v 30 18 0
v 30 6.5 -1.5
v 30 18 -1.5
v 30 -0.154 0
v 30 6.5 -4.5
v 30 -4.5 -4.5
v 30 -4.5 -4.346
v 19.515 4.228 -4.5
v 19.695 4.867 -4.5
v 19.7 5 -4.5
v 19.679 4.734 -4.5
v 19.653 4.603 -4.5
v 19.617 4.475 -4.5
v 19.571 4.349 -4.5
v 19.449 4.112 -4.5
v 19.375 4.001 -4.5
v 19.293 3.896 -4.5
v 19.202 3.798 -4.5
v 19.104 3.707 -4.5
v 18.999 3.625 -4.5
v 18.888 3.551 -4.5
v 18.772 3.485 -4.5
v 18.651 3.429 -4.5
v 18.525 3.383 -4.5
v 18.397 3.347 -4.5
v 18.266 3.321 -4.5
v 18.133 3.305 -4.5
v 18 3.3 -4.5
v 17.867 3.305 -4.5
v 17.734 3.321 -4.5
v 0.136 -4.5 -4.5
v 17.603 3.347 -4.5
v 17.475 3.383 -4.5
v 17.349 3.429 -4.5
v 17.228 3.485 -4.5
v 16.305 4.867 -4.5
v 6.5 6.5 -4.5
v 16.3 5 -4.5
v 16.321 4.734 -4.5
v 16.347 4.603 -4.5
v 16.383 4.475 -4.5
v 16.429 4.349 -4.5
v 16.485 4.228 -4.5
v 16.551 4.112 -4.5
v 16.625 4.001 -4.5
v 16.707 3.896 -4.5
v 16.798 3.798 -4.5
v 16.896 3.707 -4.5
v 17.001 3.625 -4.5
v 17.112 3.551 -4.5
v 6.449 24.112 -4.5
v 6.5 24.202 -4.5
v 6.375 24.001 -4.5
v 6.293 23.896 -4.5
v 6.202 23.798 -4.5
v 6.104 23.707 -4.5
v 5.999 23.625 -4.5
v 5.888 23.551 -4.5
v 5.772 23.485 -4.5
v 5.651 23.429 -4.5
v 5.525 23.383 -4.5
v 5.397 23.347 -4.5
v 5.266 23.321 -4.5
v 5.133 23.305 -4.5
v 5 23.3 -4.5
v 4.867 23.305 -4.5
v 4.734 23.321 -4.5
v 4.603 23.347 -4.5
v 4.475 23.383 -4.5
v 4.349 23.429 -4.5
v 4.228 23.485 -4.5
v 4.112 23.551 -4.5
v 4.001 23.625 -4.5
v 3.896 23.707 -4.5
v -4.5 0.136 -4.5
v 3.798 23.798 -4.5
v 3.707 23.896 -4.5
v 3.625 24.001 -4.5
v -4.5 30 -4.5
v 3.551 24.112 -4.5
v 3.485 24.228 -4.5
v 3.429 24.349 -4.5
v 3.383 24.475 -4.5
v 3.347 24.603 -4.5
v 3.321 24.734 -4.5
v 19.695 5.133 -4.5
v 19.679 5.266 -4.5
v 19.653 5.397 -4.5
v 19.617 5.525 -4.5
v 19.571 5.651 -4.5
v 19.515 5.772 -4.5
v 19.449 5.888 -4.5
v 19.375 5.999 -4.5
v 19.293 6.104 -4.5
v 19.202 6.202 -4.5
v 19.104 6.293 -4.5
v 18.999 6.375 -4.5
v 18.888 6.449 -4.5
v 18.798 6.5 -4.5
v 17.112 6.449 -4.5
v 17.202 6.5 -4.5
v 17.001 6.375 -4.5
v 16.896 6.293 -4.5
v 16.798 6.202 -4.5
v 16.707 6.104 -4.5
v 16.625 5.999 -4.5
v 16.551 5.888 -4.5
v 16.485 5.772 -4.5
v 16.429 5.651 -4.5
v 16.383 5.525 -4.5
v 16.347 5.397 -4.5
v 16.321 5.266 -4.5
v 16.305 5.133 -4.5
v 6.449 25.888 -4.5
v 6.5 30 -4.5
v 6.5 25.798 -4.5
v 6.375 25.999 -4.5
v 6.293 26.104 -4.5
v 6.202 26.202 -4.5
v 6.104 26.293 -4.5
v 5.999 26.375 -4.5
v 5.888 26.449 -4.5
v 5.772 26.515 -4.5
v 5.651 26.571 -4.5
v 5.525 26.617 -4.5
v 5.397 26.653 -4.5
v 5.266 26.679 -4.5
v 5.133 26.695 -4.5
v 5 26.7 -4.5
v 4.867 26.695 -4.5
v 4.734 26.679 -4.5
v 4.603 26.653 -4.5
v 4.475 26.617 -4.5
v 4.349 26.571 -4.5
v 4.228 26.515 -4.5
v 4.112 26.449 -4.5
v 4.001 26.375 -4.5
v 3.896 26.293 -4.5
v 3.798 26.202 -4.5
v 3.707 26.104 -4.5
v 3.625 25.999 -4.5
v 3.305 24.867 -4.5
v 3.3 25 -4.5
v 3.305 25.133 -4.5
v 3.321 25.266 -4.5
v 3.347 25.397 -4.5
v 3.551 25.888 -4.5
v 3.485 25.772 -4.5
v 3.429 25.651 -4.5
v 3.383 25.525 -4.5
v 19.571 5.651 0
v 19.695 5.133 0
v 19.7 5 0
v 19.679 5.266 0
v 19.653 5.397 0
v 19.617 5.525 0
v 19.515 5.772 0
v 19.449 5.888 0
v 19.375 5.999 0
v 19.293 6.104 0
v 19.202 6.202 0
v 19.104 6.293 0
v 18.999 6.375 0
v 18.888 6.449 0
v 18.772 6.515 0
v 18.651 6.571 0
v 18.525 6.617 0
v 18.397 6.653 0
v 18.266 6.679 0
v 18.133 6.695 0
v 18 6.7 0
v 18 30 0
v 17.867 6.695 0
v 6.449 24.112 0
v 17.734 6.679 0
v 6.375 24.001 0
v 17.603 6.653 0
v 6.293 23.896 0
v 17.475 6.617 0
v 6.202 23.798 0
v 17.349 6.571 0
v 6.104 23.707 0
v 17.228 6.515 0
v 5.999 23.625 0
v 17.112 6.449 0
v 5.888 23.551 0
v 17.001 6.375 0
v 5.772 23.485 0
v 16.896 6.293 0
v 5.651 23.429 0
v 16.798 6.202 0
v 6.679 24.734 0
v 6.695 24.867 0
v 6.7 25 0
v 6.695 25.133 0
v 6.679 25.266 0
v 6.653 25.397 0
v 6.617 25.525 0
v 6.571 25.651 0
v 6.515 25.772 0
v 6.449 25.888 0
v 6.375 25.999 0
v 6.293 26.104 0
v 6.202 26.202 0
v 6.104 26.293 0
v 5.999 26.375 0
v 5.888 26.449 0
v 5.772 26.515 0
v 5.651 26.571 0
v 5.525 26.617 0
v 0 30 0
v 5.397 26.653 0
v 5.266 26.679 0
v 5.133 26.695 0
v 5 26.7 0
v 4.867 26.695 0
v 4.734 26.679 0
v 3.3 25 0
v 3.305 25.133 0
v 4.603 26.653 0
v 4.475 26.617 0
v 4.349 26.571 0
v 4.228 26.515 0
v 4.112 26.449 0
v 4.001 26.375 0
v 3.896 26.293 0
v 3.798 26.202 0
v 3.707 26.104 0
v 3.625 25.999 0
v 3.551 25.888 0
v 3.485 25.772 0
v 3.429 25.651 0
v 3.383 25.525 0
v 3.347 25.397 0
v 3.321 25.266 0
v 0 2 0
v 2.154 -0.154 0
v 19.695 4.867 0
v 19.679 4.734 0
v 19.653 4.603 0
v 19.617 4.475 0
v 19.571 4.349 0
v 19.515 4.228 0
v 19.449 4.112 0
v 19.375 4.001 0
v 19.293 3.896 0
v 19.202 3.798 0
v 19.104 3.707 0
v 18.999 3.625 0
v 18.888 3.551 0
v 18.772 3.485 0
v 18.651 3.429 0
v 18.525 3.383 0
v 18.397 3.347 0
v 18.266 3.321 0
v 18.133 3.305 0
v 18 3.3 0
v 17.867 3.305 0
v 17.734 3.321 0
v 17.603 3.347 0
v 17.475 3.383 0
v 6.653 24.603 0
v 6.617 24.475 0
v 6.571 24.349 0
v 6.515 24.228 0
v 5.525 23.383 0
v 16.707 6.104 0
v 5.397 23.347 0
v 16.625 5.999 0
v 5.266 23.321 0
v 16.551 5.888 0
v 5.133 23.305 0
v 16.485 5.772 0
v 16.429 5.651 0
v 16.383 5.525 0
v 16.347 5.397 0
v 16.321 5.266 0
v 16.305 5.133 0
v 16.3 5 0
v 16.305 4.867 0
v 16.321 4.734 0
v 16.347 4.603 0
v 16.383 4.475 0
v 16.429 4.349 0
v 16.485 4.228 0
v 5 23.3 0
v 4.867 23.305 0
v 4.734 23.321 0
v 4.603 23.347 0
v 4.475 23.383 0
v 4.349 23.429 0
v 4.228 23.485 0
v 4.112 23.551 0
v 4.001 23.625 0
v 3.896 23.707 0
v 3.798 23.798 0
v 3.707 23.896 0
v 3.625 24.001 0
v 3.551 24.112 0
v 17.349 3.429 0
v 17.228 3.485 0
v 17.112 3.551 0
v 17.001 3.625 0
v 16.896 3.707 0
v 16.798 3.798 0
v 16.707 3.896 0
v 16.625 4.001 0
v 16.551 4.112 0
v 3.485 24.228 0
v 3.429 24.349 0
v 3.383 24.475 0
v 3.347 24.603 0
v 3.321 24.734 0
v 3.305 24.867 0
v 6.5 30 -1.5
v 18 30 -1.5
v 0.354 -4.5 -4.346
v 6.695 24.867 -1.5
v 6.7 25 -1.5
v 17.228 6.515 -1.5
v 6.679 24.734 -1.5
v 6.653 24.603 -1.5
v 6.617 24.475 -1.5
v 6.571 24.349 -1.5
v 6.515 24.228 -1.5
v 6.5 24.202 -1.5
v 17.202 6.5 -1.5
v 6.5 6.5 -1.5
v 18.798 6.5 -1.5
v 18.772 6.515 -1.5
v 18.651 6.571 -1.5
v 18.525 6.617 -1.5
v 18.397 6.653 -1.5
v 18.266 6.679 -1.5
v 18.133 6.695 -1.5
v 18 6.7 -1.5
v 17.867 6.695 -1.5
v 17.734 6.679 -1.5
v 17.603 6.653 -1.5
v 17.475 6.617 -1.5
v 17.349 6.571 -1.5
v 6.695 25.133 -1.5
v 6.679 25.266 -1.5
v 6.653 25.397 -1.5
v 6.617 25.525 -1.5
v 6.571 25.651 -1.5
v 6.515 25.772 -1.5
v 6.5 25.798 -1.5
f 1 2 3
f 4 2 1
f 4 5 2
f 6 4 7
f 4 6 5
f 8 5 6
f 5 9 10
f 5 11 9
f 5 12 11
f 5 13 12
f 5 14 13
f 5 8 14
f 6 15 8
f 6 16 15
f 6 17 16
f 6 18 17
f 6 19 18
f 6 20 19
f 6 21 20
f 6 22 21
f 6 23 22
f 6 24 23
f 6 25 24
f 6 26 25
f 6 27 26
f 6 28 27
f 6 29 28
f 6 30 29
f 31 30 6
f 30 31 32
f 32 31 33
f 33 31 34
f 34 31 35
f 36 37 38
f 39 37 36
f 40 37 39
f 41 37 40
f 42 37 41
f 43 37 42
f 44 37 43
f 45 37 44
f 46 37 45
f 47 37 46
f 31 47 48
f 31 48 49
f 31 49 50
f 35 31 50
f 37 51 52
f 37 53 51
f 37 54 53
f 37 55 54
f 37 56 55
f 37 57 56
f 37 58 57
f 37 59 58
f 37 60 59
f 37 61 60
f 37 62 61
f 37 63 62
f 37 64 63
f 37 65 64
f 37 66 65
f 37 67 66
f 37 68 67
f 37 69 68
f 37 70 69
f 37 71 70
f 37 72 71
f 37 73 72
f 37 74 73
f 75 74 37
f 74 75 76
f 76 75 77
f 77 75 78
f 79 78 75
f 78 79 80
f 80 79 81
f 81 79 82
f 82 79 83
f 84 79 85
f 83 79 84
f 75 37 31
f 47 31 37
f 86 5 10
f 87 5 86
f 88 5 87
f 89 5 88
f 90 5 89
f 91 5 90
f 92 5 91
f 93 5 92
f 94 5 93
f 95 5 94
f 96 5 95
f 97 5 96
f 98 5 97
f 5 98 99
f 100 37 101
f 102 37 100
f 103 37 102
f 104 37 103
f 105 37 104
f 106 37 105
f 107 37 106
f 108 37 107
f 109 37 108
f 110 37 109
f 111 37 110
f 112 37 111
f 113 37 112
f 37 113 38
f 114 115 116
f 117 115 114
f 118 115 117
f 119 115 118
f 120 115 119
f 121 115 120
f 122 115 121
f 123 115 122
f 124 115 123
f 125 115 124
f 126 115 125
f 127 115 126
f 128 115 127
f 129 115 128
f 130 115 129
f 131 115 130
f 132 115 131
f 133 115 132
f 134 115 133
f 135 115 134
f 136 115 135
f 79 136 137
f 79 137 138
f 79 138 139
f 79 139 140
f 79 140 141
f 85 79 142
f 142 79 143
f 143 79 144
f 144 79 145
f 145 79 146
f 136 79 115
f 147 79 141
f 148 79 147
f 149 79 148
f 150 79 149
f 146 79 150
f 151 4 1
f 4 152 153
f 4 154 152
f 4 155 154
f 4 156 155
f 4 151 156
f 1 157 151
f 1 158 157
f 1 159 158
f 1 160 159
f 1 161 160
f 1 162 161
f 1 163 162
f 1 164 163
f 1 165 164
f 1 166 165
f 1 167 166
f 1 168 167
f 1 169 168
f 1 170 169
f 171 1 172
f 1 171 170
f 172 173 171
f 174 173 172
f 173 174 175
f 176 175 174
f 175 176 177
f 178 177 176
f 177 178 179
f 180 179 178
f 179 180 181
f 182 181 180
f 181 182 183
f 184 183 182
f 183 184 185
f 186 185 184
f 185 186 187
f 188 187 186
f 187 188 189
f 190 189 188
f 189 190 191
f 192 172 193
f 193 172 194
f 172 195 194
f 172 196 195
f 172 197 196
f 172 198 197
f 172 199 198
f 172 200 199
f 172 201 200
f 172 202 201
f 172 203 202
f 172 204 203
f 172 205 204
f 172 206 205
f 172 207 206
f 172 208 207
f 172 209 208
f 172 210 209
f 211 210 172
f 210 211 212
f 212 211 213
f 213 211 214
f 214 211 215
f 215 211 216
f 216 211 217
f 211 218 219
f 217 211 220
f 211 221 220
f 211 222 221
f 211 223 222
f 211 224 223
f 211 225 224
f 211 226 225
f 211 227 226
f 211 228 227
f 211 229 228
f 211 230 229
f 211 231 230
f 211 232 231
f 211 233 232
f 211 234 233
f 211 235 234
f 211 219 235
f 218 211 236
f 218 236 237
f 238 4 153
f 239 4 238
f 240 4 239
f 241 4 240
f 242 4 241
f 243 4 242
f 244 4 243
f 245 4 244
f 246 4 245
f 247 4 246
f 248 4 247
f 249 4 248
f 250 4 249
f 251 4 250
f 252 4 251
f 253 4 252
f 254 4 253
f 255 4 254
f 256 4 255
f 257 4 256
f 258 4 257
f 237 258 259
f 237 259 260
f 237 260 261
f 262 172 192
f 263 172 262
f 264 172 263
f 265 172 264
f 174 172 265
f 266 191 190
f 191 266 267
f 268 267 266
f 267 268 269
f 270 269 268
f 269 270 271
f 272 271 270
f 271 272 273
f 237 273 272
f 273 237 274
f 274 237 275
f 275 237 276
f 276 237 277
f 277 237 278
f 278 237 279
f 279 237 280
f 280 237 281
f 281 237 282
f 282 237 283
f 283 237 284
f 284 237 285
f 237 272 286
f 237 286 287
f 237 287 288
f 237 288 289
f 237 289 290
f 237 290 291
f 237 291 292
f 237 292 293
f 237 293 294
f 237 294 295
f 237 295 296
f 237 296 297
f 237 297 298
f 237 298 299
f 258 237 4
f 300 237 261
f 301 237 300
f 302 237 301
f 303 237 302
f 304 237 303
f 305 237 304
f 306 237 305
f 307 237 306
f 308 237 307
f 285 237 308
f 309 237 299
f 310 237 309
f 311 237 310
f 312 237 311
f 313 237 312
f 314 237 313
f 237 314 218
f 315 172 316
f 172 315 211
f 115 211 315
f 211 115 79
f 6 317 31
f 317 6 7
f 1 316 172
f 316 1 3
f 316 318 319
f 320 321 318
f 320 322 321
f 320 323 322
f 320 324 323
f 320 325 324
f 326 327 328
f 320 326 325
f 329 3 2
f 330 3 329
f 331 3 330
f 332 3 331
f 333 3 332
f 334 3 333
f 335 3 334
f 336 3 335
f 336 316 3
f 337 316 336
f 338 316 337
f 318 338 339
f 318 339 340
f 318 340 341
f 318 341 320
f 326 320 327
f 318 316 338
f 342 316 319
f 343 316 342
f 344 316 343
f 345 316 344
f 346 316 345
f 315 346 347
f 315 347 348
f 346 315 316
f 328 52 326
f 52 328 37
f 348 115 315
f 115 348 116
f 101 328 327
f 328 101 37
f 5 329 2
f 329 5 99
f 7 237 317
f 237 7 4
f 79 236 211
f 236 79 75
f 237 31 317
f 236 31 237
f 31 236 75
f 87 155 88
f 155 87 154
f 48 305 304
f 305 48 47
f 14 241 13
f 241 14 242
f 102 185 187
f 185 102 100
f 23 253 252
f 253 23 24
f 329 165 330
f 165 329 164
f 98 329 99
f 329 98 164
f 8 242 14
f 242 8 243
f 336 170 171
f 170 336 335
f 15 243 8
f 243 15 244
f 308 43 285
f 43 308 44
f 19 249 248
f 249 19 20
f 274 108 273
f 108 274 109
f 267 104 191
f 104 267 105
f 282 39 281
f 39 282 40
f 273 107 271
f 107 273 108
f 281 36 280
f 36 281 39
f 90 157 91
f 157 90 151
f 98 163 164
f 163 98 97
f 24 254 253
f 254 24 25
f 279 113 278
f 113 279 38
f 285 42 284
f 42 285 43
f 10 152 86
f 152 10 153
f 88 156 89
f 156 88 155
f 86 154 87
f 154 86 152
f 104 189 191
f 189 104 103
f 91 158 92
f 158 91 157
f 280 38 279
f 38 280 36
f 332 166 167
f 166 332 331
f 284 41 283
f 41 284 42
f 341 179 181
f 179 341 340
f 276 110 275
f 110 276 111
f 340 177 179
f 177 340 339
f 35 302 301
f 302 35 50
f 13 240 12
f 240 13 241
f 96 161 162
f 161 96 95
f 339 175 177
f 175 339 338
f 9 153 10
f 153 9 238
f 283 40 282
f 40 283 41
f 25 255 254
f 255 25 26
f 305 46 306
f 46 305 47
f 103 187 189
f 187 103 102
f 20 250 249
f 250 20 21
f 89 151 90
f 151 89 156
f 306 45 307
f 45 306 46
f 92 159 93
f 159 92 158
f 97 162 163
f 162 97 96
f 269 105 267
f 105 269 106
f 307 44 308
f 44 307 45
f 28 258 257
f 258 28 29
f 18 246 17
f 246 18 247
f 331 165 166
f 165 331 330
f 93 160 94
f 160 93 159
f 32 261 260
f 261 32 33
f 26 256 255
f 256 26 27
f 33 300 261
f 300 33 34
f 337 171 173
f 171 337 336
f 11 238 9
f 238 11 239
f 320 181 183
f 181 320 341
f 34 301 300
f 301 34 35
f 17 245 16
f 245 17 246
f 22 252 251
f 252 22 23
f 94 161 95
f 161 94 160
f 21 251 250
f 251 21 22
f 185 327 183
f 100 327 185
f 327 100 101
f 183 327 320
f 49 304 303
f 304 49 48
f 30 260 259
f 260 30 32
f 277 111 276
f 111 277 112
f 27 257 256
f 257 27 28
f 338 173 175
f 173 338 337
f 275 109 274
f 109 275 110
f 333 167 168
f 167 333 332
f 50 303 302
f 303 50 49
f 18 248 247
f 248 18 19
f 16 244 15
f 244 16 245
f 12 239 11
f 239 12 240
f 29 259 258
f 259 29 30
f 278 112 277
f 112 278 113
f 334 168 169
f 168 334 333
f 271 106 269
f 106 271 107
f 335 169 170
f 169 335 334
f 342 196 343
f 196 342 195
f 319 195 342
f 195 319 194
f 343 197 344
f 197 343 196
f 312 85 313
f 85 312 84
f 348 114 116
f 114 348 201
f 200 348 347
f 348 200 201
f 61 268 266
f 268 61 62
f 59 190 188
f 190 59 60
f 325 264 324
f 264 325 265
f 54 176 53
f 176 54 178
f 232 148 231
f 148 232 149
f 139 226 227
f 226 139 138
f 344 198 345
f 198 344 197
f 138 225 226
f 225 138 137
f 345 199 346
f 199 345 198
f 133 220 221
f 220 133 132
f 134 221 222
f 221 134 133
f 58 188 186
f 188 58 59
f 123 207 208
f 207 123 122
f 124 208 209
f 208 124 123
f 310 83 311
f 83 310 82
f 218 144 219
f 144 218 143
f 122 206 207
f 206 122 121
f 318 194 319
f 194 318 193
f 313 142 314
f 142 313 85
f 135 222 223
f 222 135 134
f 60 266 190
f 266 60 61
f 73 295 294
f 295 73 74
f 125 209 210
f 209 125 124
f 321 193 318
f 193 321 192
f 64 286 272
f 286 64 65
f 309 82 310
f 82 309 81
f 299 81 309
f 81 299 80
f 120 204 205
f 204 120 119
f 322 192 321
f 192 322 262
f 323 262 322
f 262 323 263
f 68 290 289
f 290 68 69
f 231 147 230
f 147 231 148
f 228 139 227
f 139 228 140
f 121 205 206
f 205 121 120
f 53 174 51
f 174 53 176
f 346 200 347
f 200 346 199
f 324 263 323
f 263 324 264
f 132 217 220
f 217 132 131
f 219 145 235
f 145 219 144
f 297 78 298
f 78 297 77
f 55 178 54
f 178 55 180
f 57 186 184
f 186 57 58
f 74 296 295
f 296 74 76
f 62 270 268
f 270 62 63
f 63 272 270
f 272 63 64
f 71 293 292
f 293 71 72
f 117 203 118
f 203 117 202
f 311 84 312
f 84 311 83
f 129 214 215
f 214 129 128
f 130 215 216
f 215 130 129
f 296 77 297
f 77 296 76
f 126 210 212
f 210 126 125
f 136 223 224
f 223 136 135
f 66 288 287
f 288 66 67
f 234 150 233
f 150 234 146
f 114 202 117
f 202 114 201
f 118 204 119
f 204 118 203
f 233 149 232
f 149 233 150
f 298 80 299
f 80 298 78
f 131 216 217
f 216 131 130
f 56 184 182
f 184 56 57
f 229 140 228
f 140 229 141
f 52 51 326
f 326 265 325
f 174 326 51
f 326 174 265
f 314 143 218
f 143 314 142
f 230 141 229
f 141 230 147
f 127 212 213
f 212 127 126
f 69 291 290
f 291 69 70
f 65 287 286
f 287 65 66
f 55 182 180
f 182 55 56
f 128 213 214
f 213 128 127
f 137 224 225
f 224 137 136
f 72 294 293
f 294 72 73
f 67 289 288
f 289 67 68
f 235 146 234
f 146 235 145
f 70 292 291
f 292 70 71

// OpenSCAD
// file: params.scad
EXTRUSION_LEN = 150;
MOTOR_SIZE = 1.4*25.4;

MGN5_CARR_LEN = 16;
MGN7_CARR_LEN = 30.8;
ST3H_CARR_LEN = 15.5;

BED_X = 90;
BED_Y = 80;

MAIN = "#202020";
ACCENT = "red";

TOPHAT_HEIGHT = 100;
// file: panels.scad
include <params.scad>;

module deck_panel() {
    minkowski() {
        difference() {
            square([EXTRUSION_LEN, EXTRUSION_LEN-MOTOR_SIZE]);
            
            // Front corners
            square([4, 4]);
            translate([EXTRUSION_LEN - 4, 0]) square([4, 4]);
            
            // Rear space
            translate([EXTRUSION_LEN/2-32.5, EXTRUSION_LEN-MOTOR_SIZE-20]) square([65, 20]);
            translate([EXTRUSION_LEN/2-18, EXTRUSION_LEN-MOTOR_SIZE-26]) square([36, 26]);
            
            // Cable chain hole
            translate([EXTRUSION_LEN/2+32.5, EXTRUSION_LEN-MOTOR_SIZE-16]) square([12, 16]);
        }
        circle(r=1.5);
    }
}

module motor_panel() {
    minkowski() {
        difference() {
            square([EXTRUSION_LEN-25*2-26-3, MOTOR_SIZE-3]);
        
            translate([-1.5, (MOTOR_SIZE-3)/2-3.5]) square([6, 3.5+4]);
            translate([EXTRUSION_LEN-25*2-26-3-3-1.5, (MOTOR_SIZE-3)/2-3.5]) square([6, 3.5+4]);
        }
        
        circle(r=1.5);
    }
}

module screw_hole() {
    hull() {
        translate([-1, 0]) circle(r=1.75);
        translate([1, 0]) circle(r=1.75);
    }
}

module rear_chamber_panel() {
    translate([.5, .5]) difference() {
        square([EXTRUSION_LEN+19, EXTRUSION_LEN-20-1]);
        
        translate([10+EXTRUSION_LEN/2-25, 35]) screw_hole();
        translate([10+EXTRUSION_LEN/2-25, 70]) screw_hole();
        translate([10+EXTRUSION_LEN/2-25, 105]) screw_hole();
        
        translate([10+EXTRUSION_LEN/2+25, 35]) screw_hole();
        translate([10+EXTRUSION_LEN/2+25, 70]) screw_hole();
        translate([10+EXTRUSION_LEN/2+25, 105]) screw_hole();
    }
}

module base_panel() {
    // Outer edges of panel are EXTRUSION_LEN+20 - 14
    difference() {
        hull() {
            translate([10.5, 10.5]) circle(r=10);
            translate([EXTRUSION_LEN - 4.5, 10.5]) circle(r=10);
            translate([10.5, EXTRUSION_LEN - 4.5]) circle(r=10);
            translate([EXTRUSION_LEN - 4.5, EXTRUSION_LEN - 4.5]) circle(r=10);
        }
        
        // Screw holes
        translate([8, 8]) circle(r=1.7);
        translate([EXTRUSION_LEN - 2, 8]) circle(r=1.7);
        translate([8, EXTRUSION_LEN - 2]) circle(r=1.7);
        translate([EXTRUSION_LEN - 2, EXTRUSION_LEN - 2]) circle(r=1.7);
        
    }
}

module back_panel_top() {
    square([EXTRUSION_LEN+5, 43+9.75]);
}

module back_panel_bottom() {
    difference() {
        square([EXTRUSION_LEN+5, EXTRUSION_LEN-9.75]);
    
        // Fan holes
        // Fans are centred under the motors. Thus, they are centred at (EXTRUSION_LEN-45)/2 mm from the bottom
        translate([2.5+EXTRUSION_LEN/2, (EXTRUSION_LEN-45)/2])  union() {
            circle(r=18);
         
            // Screw holes
            translate([16, 16]) circle(r=1.7);
            translate([16, -16]) circle(r=1.7);
            translate([-16, 16]) circle(r=1.7);
            translate([-16, -16]) circle(r=1.7);
        }
        
//        translate([3*EXTRUSION_LEN/4+3, (EXTRUSION_LEN-45)/2]) union() {
//            circle(r=18);
//         
//            // Screw holes
//            translate([16, 16]) circle(r=1.7);
//            translate([16, -16]) circle(r=1.7);
//            translate([-16, 16]) circle(r=1.7);
//            translate([-16, -16]) circle(r=1.7);
//        }
    }
}

module side_panel() {
    square([EXTRUSION_LEN+5, EXTRUSION_LEN+43-8-8]);
}

module door_panel() {
    square([EXTRUSION_LEN+5, EXTRUSION_LEN+43-8]);
}

module tophat_side_panel() {
    square([EXTRUSION_LEN+5, TOPHAT_HEIGHT-8]);
}

module tophat_top_panel() {
    square([EXTRUSION_LEN+5, EXTRUSION_LEN+5]);
}

$fn=40;
back_panel_bottom();
// file: extrusion.scad
$fa = 0.1;
$fs = 0.1;

module extrusion(length) {
    color("#3f3f3f") linear_extrude(length) union() {
        for (i = [0:4]) {
            rotate([0, 0, 90*i]) segment();
            rotate([0, 0, 90*i]) scale([-1, 1, 1]) segment();
        }
    }
}

module segment() {
    difference() {
        polygon([[0, 2], [1, 2], [3, 4], [1.5, 4], [1.5, 5], [5,5], [0, 0]]);
        circle(1.25);
    }
}
// main file
use <extrusion.scad>;
use <panels.scad>;

include <params.scad>;

module tophat() {
    // Square section
    translate([0, 0, TOPHAT_HEIGHT-10]) union() {
        //translate([10, 5, 5]) rotate([0, 90, 0]) extrusion(EXTRUSION_LEN);
        translate([5, 10, 5]) rotate([-90, 0, 0]) extrusion(EXTRUSION_LEN);
        //translate([10, EXTRUSION_LEN+15, 5]) rotate([0, 90, 0]) extrusion(EXTRUSION_LEN);
        translate([EXTRUSION_LEN+15, 10, 5]) rotate([-90, 0, 0]) extrusion(EXTRUSION_LEN);
    }
    
    // Verticals
    //translate([5, 5, 0]) extrusion(TOPHAT_HEIGHT);
    //translate([EXTRUSION_LEN+15, 5, 0]) extrusion(TOPHAT_HEIGHT);
    //translate([EXTRUSION_LEN+15, EXTRUSION_LEN+15, 0]) extrusion(TOPHAT_HEIGHT);
    //translate([5, EXTRUSION_LEN+15, 0]) extrusion(TOPHAT_HEIGHT);
    
    front_printed_ushape();
    translate([0, EXTRUSION_LEN+20, 0]) rear_printed_ushape();
    
    // Tophat panels
    color("#afafaf7f") union() {
        translate([7.5, 7.5, TOPHAT_HEIGHT]) linear_extrude(3) tophat_top_panel();
        translate([7.5, 0, 0.5]) rotate([90, 0, 0]) linear_extrude(3) tophat_side_panel();
        translate([7.5, EXTRUSION_LEN+20+3, 0.5]) rotate([90, 0, 0]) linear_extrude(3) tophat_side_panel();
        translate([-3, 7.5, 0.5]) rotate([90, 0, 90]) linear_extrude(3) tophat_side_panel();
        translate([EXTRUSION_LEN+20, 7.5, 0.5]) rotate([90, 0, 90]) linear_extrude(3) tophat_side_panel();
    }
    
    // Top corner clips
    translate([0, 0, TOPHAT_HEIGHT+2.5]) corner_clips();
translate([EXTRUSION_LEN+20, 0, TOPHAT_HEIGHT+2.5]) rotate([0, 0, 90]) corner_clips();
translate([EXTRUSION_LEN+20, EXTRUSION_LEN+20, TOPHAT_HEIGHT+2.5]) rotate([0, 0, 180]) corner_clips();
translate([0, EXTRUSION_LEN+20, TOPHAT_HEIGHT+2.5]) rotate([0, 0, -90]) corner_clips();
    
    // Bottom corner_clips
    bottom_corner_clips();
translate([EXTRUSION_LEN+20, 0, 0]) rotate([0, 0, 90]) bottom_corner_clips();
translate([EXTRUSION_LEN+20, EXTRUSION_LEN+20, 0]) rotate([0, 0, 180]) bottom_right_corner_clip();
translate([0, EXTRUSION_LEN+20, 0]) rotate([0, 0, -90]) bottom_left_corner_clip();
}

PANEL_THICKNESS = 3;

module top_corner_clip() {
    color(MAIN) difference() {
       union() {
           translate([-4.5, -4.5, 0]) cube([30+4.5, 30+4.5, PANEL_THICKNESS+1.5]);
       }
       
       // Shape cutout
       translate([30, 18, -0.01]) rotate([0, 0, 45]) cube([34, 22, PANEL_THICKNESS+1.6]);
       
       // Panel cutout
       translate([6.5, 6.5, 1.5]) cube([100, 100, PANEL_THICKNESS+1]);
       
       // Edge chamfers       
       // Long edge outside
       translate([-5, -6.7*sqrt(2), (PANEL_THICKNESS+1.5)/2]) rotate([-45, 0, 0]) cube([100, 100, 5]);
       
       // Short edge outside
       translate([0, -15, 0]) rotate([0, -45, 0]) translate([-5, 0, 0]) cube([5, 100, 15]);
       
       // Corner chamfer
       translate([-4, -4, 0]) rotate([-45, 0, -45]) cube([10, 10, 10], center=true);
       
       // Screw holes
       translate([18, 5, -0.01]) cylinder(r=1.7, h=50);
       translate([5, 25, -0.01]) cylinder(r=1.7, h=50);
   }
}
module left_corner_clip() {
    color(MAIN) difference() {
       union() {
           translate([-4.5/sqrt(2), 2.5, 0]) cube([30+4.5/sqrt(2), 30.5, PANEL_THICKNESS+1.5]);
       }
       
       // Shape cutout
       translate([30, 18, -0.01]) rotate([0, 0, 45]) cube([34, 22, PANEL_THICKNESS+1.6]);
       
       // Panel cutout
       translate([7.5, 10, 1.5]) cube([100, 100, PANEL_THICKNESS+1]);
       
       // Edge chamfers
       // Short edge outside
       translate([0, -1, 0]) rotate([0, -45, 0]) translate([-5, 0, 0]) cube([5, 100, 5]);
       // Short edge inside
       translate([-4.5/sqrt(2), -1, 1]) rotate([0, 45, 0]) translate([-5, 0, 0]) cube([5, 100, 5]);
       
       // Screw holes
       translate([25, 7.5, -0.01]) cylinder(r=1.7, h=50);
       translate([5, 20.5, -0.01]) cylinder(r=1.7, h=50);
   }
}

module right_corner_clip() {
    color(MAIN) scale([-1, 1, 1]) difference() {
       union() {
           translate([-4.5/sqrt(2), 2.5, 0]) cube([30+4.5/sqrt(2), 30.5, PANEL_THICKNESS+1.5]);
       }
       
       // Shape cutout
       translate([30, 18, -0.01]) rotate([0, 0, 45]) cube([34, 22, PANEL_THICKNESS+1.6]);
       
       // Panel cutout
       translate([7.5, 10, 1.5]) cube([100, 100, PANEL_THICKNESS+1]);
       
       // Edge chamfers
       // Short edge outside
       translate([0, -1, 0]) rotate([0, -45, 0]) translate([-5, 0, 0]) cube([5, 100, 5]);
       // Short edge inside
       translate([-4.5/sqrt(2), -1, 1]) rotate([0, 45, 0]) translate([-5, 0, 0]) cube([5, 100, 5]);
       
       // Screw holes
       translate([18, 7.5, -0.01]) cylinder(r=1.7, h=50);
       translate([5, 27.5, -0.01]) cylinder(r=1.7, h=50);
   }
}


module bottom_left_corner_clip() {
    color(MAIN) translate([0, -4.5, -2.5]) scale([1, 1, -1]) rotate([-90, 0, 0]) difference() {
       union() {
           translate([-2.5, 2.5, 0]) cube([30+2.5, 22.5, PANEL_THICKNESS+1.5]);
       }
       
       // Shape cutout
       translate([30, 14, -0.01]) rotate([0, 0, 45]) cube([36, 22, PANEL_THICKNESS+1.6]);
       
       // Panel cutout
       translate([7.5, -0.01, 1.5]) cube([100, 100, PANEL_THICKNESS+1]);
       
       // Edge chamfers
       // Short edge outside
       translate([0, -1, 0]) rotate([0, -45, 0]) translate([-5, 0, 0]) cube([5, 100, 5]);
       // Short edge inside
       translate([-4.5/sqrt(2), -1, 1]) rotate([0, 45, 0]) translate([-5, 0, 0]) cube([5, 100, 5]);
       
       // Screw holes
       translate([5, 17.5, -0.01]) cylinder(r=1.7, h=50);
   }
}

module bottom_right_corner_clip() {
    color(MAIN) translate([-4.5, 0, -2.5]) scale([-1, 1, -1]) rotate([-90, 0, 90]) difference() {
       union() {
           translate([-2.5, 2.5, 0]) cube([30+2.5, 22.5, PANEL_THICKNESS+1.5]);
       }
       
       // Shape cutout
       translate([30, 14, -0.01]) rotate([0, 0, 45]) cube([36, 22, PANEL_THICKNESS+1.6]);
       
       // Panel cutout
       translate([7.5, -0.01, 1.5]) cube([100, 100, PANEL_THICKNESS+1]);
       
       // Edge chamfers
       // Short edge outside
       translate([0, -1, 0]) rotate([0, -45, 0]) translate([-5, 0, 0]) cube([5, 100, 5]);
       // Short edge inside
       translate([-4.5/sqrt(2), -1, 1]) rotate([0, 45, 0]) translate([-5, 0, 0]) cube([5, 100, 5]);
       
       // Screw holes
       translate([5, 10, -0.01]) cylinder(r=1.7, h=50);
   }
}

module front_printed_ushape() {
    difference() {
        union() {
            cube([10, 10, TOPHAT_HEIGHT]);
            translate([10+EXTRUSION_LEN, 0, 0]) cube([10, 10, TOPHAT_HEIGHT]);
            translate([10, 0, TOPHAT_HEIGHT-10]) cube([EXTRUSION_LEN, 10, 10]);
        }
    
        // Top extrusion screw holes
        translate([5, -0.01, TOPHAT_HEIGHT - 5]) rotate([-90, 0, 0]) cylinder(r=1.7, h=50);
        translate([5, -0.01, TOPHAT_HEIGHT - 5]) rotate([-90, 0, 0]) cylinder(r=3, h=6);
        
        translate([EXTRUSION_LEN+15, -0.01, TOPHAT_HEIGHT - 5]) rotate([-90, 0, 0]) cylinder(r=1.7, h=50);
        translate([EXTRUSION_LEN+15, -0.01, TOPHAT_HEIGHT - 5]) rotate([-90, 0, 0]) cylinder(r=3, h=6);
        
        // Cam lock screw holes
        translate([5, 5, -0.01]) cylinder(r=2.35, h=6);
        translate([EXTRUSION_LEN+15, 5, -0.01]) cylinder(r=2.35, h=6);
        
        // Screw insert holes
        // Front left clip
        translate([5, -0.01, TOPHAT_HEIGHT - 18]) rotate([-90, 0, 0]) cylinder(r=2.35, h=6);
        translate([25, -0.01, TOPHAT_HEIGHT - 5]) rotate([-90, 0, 0]) cylinder(r=2.35, h=6);
        // Front right clip
        translate([EXTRUSION_LEN+15, -0.01, TOPHAT_HEIGHT - 25]) rotate([-90, 0, 0]) cylinder(r=2.35, h=6);
        translate([EXTRUSION_LEN+20-18, -0.01, TOPHAT_HEIGHT - 5]) rotate([-90, 0, 0]) cylinder(r=2.35, h=6);
        // Top left clip
        translate([18, 5, TOPHAT_HEIGHT - 5.99]) cylinder(r=2.35, h=6);
        // Top right clip
        translate([EXTRUSION_LEN+20-25, 5, TOPHAT_HEIGHT - 5.99]) cylinder(r=2.35, h=6);
        // Left side clip
        translate([-0.01, 5, TOPHAT_HEIGHT - 25]) rotate([0, 90, 0]) cylinder(r=2.35, h=6);
        // Right side clip
        translate([EXTRUSION_LEN+20-5.99, 5, TOPHAT_HEIGHT - 18]) rotate([0, 90, 0]) cylinder(r=2.35, h=6);
        // Left-side bottom clip
        translate([-0.01, 5, 7.5]) rotate([0, 90, 0]) cylinder(r=2.35, h=6);
        // Left-front bottom clip
        translate([5, -0.01, 15]) rotate([-90, 0, 0]) cylinder(r=2.35, h=6);
        // Right-side bottom clip
        translate([EXTRUSION_LEN+20-5.99, 5, 15]) rotate([0, 90, 0]) cylinder(r=2.35, h=6);
        // Right-front bottom clip
        translate([EXTRUSION_LEN+15, -0.01, 7.5]) rotate([-90, 0, 0]) cylinder(r=2.35, h=6);
    }
}

module rear_printed_ushape() {
    translate([EXTRUSION_LEN+20, 0, 0]) scale([-1, -1, 1]) difference() {
        union() {
            cube([10, 10, TOPHAT_HEIGHT]);
            translate([10+EXTRUSION_LEN, 0, 0]) cube([10, 10, TOPHAT_HEIGHT]);
            translate([10, 0, TOPHAT_HEIGHT-10]) cube([EXTRUSION_LEN, 10, 10]);
        }
    
        // Top extrusion screw holes
        translate([5, -0.01, TOPHAT_HEIGHT - 5]) rotate([-90, 0, 0]) cylinder(r=1.7, h=50);
        translate([5, -0.01, TOPHAT_HEIGHT - 5]) rotate([-90, 0, 0]) cylinder(r=3.2, h=6);
        
        translate([EXTRUSION_LEN+15, -0.01, TOPHAT_HEIGHT - 5]) rotate([-90, 0, 0]) cylinder(r=1.7, h=50);
        translate([EXTRUSION_LEN+15, -0.01, TOPHAT_HEIGHT - 5]) rotate([-90, 0, 0]) cylinder(r=3.2, h=6);
        
        // Screw insert holes
        // Front left clip
        translate([5, -0.01, TOPHAT_HEIGHT - 18]) rotate([-90, 0, 0]) cylinder(r=2.45, h=6);
        translate([25, -0.01, TOPHAT_HEIGHT - 5]) rotate([-90, 0, 0]) cylinder(r=2.45, h=6);
        // Front right clip
        translate([EXTRUSION_LEN+15, -0.01, TOPHAT_HEIGHT - 25]) rotate([-90, 0, 0]) cylinder(r=2.45, h=6);
        translate([EXTRUSION_LEN+20-18, -0.01, TOPHAT_HEIGHT - 5]) rotate([-90, 0, 0]) cylinder(r=2.45, h=6);
        // Top left clip
        translate([18, 5, TOPHAT_HEIGHT - 5.99]) cylinder(r=2.45, h=6);
        // Top right clip
        translate([EXTRUSION_LEN+20-25, 5, TOPHAT_HEIGHT - 5.99]) cylinder(r=2.45, h=6);
        // Left side clip
        translate([-0.01, 5, TOPHAT_HEIGHT - 25]) rotate([0, 90, 0]) cylinder(r=2.45, h=6);
        // Right side clip
        translate([EXTRUSION_LEN+20-5.99, 5, TOPHAT_HEIGHT - 18]) rotate([0, 90, 0]) cylinder(r=2.45, h=6);
        // Left-side bottom clip
        translate([-0.01, 5, 15]) rotate([0, 90, 0]) cylinder(r=2.45, h=6);
        // Right-side bottom clip
        translate([EXTRUSION_LEN+20-5.99, 5, 15]) rotate([0, 90, 0]) cylinder(r=2.45, h=6);
        
        // Hinge grooves
        translate([(10-5.6)/2, 3, -0.01]) linear_extrude(53) union() {
            square([5.6, 2.4]);
            translate([1.3, -3.01]) square([3, 3.1]);
        }
        translate([EXTRUSION_LEN+10+(10-5.6)/2, 3, -0.01]) linear_extrude(53) union() {
            square([5.6, 2.4]);
            translate([1.3, -3.01]) square([3, 3.1]);
        }
    }
}

module hinge() {
    lower_hinge();
    top_hinge();
}

module lower_hinge() {
    // M3 nuts are 9.5mm wide, which means the lower screw needs to be centred 4.75mm from the top of the vertical frame extrusions.
    // Thread insert is 31mm from the base of the drive block.
    // In total, this makes it a gap of 35.75mm, maybe 36 after shrinkage.
}

module top_hinge() {
    
}

module corner_clips() {
    translate([0, 0, 2]) scale([1, 1, -1]) top_corner_clip();
translate([0, -4.5, 0]) rotate([-90, 0, 0]) left_corner_clip();

translate([-4.5, 0, 0]) rotate([-90, 0, -90]) right_corner_clip();
}

module bottom_corner_clips() {
    bottom_left_corner_clip();
    bottom_right_corner_clip();
}

//translate([0, 0, -290]) import("STLs/TH_Hinge_B_Bottom_x1.stl");
//translate([0, 0, 310]) import("STLs/TH_Hinge_B_Top_x1.stl");

$fn=80;
//tophat();

scale([1, 1, -1]) top_corner_clip();
